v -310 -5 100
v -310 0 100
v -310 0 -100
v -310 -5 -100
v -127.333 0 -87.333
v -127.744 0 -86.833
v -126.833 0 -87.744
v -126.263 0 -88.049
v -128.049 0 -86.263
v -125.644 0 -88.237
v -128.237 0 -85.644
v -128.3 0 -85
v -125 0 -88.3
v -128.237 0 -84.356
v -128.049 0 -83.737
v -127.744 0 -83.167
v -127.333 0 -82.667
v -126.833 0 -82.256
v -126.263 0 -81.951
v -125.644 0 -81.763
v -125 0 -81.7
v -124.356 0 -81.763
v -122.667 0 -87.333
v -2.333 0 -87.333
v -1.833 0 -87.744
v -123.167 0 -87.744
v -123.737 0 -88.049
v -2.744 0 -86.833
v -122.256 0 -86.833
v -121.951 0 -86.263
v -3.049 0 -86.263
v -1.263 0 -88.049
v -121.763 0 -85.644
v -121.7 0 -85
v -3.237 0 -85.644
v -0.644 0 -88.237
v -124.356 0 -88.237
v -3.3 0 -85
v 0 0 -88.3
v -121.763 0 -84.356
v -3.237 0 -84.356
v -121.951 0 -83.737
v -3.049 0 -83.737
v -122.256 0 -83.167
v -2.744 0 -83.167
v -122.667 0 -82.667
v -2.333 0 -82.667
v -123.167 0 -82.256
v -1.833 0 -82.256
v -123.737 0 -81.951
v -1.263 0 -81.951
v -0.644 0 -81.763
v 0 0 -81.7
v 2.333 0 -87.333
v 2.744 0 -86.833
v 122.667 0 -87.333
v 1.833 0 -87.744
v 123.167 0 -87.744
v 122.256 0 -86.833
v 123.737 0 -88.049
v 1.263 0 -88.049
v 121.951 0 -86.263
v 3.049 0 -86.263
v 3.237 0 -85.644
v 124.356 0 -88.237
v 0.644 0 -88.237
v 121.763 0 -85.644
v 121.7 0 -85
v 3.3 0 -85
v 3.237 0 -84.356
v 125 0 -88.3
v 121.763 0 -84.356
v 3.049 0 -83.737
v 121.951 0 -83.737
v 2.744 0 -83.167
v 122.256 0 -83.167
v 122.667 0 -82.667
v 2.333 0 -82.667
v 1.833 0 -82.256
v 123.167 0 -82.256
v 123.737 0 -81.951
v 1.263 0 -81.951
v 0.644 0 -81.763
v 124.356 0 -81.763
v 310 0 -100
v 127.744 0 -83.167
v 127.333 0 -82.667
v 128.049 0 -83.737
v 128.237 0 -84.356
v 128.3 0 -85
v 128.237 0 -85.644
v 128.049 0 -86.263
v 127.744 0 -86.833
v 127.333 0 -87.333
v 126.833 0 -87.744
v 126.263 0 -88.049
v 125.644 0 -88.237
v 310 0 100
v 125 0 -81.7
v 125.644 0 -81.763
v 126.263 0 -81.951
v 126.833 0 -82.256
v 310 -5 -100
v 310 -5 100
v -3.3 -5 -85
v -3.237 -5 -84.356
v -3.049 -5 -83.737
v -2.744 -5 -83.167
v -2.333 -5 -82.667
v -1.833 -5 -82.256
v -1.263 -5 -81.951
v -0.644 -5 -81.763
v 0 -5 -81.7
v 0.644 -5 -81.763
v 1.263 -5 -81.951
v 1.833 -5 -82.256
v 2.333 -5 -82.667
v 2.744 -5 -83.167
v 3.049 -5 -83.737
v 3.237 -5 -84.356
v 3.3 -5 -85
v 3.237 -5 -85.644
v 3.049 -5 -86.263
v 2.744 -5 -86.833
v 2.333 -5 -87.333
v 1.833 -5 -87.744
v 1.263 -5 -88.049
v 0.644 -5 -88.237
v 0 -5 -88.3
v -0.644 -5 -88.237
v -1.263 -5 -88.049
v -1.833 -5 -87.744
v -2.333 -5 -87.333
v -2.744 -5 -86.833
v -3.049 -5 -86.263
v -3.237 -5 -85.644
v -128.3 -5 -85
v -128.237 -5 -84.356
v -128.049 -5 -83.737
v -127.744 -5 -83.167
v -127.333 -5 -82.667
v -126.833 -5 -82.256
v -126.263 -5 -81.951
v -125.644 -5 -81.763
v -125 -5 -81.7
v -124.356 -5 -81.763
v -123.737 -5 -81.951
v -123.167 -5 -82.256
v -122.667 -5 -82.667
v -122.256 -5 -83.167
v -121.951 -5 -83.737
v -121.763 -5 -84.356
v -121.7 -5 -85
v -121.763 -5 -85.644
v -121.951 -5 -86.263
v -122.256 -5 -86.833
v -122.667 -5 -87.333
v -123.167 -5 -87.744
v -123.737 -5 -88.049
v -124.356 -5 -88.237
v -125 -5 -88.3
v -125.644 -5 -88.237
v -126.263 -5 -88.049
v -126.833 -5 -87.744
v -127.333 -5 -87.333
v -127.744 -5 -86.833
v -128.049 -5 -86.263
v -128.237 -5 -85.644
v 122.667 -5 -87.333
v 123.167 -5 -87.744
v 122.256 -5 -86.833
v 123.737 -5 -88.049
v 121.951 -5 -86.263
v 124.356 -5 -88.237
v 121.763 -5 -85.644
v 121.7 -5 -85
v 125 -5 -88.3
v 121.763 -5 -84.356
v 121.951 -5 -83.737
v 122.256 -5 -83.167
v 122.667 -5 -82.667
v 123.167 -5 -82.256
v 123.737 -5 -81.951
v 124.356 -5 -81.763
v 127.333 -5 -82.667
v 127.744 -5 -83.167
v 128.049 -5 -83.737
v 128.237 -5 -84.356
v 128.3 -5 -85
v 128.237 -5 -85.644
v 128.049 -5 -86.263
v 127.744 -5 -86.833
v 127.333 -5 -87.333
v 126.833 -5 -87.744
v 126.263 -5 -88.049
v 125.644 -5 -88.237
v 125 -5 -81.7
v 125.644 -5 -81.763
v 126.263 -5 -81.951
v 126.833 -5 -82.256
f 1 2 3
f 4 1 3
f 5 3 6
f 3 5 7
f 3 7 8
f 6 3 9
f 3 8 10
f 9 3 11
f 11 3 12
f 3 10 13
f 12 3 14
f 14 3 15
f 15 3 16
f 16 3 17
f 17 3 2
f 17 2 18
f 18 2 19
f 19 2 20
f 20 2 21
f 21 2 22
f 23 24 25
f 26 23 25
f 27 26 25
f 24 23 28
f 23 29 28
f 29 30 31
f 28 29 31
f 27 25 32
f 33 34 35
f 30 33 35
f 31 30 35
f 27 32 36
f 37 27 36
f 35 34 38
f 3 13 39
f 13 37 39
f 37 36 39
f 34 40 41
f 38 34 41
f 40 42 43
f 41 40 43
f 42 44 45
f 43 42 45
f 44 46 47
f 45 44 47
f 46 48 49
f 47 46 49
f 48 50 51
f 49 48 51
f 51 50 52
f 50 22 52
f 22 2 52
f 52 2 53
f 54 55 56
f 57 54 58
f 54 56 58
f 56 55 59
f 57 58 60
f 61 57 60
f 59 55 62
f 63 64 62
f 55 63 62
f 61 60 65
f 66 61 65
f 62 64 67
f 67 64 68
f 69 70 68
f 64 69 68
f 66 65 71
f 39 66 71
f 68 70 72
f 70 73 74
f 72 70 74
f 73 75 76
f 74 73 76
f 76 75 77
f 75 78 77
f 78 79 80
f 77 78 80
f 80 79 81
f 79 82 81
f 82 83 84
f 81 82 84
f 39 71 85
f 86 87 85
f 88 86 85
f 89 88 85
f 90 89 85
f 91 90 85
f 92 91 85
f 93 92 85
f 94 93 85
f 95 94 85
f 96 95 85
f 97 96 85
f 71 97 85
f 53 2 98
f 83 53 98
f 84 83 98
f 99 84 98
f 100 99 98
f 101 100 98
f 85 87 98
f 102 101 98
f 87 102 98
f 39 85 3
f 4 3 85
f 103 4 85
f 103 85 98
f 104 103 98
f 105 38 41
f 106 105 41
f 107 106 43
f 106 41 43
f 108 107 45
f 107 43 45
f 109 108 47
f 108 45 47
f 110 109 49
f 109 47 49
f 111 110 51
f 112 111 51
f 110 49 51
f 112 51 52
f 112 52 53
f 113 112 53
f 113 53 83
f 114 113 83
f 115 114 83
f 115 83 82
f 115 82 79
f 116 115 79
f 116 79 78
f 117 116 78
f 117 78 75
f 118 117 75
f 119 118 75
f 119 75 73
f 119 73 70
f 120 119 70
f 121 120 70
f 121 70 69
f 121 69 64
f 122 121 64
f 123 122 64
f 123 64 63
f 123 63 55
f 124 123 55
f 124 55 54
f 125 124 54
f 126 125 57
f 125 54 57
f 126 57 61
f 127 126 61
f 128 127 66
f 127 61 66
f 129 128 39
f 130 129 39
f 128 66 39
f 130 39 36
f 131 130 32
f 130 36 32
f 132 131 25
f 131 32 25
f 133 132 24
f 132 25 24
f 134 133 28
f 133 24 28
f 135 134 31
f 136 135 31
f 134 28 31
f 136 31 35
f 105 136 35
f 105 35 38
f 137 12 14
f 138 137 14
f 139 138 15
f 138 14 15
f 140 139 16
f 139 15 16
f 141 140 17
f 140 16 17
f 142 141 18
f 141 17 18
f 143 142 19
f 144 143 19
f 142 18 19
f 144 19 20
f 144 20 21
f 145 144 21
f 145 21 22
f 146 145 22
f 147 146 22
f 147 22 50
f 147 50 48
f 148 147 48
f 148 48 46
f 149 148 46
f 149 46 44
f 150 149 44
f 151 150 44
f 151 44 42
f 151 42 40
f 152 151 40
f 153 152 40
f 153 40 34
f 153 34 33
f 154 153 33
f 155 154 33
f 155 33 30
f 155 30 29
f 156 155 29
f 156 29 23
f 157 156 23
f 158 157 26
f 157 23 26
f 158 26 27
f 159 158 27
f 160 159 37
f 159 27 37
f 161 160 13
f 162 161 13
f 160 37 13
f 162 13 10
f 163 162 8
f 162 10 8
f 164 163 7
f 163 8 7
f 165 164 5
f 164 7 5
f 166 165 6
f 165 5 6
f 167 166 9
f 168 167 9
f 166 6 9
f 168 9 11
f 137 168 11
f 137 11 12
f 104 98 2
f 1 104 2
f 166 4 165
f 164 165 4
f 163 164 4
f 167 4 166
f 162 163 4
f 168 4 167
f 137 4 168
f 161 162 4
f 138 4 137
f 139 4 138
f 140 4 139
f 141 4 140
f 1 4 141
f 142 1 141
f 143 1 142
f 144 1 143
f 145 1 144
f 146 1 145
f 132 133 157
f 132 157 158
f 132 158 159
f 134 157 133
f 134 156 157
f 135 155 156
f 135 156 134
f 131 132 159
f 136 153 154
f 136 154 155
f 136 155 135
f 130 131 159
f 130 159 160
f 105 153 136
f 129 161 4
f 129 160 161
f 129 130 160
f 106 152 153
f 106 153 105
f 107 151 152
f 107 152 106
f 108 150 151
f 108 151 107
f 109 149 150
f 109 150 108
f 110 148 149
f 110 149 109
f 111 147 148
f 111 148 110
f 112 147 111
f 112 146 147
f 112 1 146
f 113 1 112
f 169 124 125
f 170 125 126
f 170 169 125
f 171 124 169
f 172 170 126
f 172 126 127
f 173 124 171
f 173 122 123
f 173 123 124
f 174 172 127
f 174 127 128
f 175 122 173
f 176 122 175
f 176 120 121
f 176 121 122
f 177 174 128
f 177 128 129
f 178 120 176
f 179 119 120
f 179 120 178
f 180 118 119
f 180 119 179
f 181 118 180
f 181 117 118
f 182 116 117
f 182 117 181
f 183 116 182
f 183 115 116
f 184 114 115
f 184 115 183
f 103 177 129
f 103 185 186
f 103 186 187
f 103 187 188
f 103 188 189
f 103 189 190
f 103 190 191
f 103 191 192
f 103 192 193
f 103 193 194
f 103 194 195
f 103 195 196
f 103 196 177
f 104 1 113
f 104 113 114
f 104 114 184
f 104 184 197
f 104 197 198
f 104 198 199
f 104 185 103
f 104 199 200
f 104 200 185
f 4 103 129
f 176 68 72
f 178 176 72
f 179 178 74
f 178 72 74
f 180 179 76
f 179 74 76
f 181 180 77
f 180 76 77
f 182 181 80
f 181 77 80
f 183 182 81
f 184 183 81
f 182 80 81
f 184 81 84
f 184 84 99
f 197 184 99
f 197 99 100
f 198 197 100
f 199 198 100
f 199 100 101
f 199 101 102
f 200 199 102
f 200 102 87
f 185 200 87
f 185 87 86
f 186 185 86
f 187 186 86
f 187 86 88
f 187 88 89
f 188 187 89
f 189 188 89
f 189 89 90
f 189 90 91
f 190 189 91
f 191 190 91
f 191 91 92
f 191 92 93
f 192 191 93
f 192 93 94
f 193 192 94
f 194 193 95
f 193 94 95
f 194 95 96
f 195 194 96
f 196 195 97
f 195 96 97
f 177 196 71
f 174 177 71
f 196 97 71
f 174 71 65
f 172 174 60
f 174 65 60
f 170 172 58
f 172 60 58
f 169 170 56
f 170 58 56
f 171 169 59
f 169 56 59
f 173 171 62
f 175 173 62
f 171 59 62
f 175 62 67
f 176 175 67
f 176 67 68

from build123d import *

# Parameters (mm, degrees)
F1_DEPTH = 5
F3_D     = 6.6


# Not quite as in the source:
# - a feature names something its author has since deleted; it is built from what else it names


with BuildPart() as f1:
    # F0 (on Front) → F1 (new body)
    with BuildSketch(Plane.XZ):
        Polygon((-250, 100), (-310, 100), (-310, -100), (310, -100), (310, 100), align=None)
    extrude(amount=F1_DEPTH)

    # F3 (through all)
    with Locations(Plane.XZ.offset(5)):
        with Locations((-125, -85), (125, -85), (0, -85)):
            Hole(F3_D / 2)


solid = f1.part
